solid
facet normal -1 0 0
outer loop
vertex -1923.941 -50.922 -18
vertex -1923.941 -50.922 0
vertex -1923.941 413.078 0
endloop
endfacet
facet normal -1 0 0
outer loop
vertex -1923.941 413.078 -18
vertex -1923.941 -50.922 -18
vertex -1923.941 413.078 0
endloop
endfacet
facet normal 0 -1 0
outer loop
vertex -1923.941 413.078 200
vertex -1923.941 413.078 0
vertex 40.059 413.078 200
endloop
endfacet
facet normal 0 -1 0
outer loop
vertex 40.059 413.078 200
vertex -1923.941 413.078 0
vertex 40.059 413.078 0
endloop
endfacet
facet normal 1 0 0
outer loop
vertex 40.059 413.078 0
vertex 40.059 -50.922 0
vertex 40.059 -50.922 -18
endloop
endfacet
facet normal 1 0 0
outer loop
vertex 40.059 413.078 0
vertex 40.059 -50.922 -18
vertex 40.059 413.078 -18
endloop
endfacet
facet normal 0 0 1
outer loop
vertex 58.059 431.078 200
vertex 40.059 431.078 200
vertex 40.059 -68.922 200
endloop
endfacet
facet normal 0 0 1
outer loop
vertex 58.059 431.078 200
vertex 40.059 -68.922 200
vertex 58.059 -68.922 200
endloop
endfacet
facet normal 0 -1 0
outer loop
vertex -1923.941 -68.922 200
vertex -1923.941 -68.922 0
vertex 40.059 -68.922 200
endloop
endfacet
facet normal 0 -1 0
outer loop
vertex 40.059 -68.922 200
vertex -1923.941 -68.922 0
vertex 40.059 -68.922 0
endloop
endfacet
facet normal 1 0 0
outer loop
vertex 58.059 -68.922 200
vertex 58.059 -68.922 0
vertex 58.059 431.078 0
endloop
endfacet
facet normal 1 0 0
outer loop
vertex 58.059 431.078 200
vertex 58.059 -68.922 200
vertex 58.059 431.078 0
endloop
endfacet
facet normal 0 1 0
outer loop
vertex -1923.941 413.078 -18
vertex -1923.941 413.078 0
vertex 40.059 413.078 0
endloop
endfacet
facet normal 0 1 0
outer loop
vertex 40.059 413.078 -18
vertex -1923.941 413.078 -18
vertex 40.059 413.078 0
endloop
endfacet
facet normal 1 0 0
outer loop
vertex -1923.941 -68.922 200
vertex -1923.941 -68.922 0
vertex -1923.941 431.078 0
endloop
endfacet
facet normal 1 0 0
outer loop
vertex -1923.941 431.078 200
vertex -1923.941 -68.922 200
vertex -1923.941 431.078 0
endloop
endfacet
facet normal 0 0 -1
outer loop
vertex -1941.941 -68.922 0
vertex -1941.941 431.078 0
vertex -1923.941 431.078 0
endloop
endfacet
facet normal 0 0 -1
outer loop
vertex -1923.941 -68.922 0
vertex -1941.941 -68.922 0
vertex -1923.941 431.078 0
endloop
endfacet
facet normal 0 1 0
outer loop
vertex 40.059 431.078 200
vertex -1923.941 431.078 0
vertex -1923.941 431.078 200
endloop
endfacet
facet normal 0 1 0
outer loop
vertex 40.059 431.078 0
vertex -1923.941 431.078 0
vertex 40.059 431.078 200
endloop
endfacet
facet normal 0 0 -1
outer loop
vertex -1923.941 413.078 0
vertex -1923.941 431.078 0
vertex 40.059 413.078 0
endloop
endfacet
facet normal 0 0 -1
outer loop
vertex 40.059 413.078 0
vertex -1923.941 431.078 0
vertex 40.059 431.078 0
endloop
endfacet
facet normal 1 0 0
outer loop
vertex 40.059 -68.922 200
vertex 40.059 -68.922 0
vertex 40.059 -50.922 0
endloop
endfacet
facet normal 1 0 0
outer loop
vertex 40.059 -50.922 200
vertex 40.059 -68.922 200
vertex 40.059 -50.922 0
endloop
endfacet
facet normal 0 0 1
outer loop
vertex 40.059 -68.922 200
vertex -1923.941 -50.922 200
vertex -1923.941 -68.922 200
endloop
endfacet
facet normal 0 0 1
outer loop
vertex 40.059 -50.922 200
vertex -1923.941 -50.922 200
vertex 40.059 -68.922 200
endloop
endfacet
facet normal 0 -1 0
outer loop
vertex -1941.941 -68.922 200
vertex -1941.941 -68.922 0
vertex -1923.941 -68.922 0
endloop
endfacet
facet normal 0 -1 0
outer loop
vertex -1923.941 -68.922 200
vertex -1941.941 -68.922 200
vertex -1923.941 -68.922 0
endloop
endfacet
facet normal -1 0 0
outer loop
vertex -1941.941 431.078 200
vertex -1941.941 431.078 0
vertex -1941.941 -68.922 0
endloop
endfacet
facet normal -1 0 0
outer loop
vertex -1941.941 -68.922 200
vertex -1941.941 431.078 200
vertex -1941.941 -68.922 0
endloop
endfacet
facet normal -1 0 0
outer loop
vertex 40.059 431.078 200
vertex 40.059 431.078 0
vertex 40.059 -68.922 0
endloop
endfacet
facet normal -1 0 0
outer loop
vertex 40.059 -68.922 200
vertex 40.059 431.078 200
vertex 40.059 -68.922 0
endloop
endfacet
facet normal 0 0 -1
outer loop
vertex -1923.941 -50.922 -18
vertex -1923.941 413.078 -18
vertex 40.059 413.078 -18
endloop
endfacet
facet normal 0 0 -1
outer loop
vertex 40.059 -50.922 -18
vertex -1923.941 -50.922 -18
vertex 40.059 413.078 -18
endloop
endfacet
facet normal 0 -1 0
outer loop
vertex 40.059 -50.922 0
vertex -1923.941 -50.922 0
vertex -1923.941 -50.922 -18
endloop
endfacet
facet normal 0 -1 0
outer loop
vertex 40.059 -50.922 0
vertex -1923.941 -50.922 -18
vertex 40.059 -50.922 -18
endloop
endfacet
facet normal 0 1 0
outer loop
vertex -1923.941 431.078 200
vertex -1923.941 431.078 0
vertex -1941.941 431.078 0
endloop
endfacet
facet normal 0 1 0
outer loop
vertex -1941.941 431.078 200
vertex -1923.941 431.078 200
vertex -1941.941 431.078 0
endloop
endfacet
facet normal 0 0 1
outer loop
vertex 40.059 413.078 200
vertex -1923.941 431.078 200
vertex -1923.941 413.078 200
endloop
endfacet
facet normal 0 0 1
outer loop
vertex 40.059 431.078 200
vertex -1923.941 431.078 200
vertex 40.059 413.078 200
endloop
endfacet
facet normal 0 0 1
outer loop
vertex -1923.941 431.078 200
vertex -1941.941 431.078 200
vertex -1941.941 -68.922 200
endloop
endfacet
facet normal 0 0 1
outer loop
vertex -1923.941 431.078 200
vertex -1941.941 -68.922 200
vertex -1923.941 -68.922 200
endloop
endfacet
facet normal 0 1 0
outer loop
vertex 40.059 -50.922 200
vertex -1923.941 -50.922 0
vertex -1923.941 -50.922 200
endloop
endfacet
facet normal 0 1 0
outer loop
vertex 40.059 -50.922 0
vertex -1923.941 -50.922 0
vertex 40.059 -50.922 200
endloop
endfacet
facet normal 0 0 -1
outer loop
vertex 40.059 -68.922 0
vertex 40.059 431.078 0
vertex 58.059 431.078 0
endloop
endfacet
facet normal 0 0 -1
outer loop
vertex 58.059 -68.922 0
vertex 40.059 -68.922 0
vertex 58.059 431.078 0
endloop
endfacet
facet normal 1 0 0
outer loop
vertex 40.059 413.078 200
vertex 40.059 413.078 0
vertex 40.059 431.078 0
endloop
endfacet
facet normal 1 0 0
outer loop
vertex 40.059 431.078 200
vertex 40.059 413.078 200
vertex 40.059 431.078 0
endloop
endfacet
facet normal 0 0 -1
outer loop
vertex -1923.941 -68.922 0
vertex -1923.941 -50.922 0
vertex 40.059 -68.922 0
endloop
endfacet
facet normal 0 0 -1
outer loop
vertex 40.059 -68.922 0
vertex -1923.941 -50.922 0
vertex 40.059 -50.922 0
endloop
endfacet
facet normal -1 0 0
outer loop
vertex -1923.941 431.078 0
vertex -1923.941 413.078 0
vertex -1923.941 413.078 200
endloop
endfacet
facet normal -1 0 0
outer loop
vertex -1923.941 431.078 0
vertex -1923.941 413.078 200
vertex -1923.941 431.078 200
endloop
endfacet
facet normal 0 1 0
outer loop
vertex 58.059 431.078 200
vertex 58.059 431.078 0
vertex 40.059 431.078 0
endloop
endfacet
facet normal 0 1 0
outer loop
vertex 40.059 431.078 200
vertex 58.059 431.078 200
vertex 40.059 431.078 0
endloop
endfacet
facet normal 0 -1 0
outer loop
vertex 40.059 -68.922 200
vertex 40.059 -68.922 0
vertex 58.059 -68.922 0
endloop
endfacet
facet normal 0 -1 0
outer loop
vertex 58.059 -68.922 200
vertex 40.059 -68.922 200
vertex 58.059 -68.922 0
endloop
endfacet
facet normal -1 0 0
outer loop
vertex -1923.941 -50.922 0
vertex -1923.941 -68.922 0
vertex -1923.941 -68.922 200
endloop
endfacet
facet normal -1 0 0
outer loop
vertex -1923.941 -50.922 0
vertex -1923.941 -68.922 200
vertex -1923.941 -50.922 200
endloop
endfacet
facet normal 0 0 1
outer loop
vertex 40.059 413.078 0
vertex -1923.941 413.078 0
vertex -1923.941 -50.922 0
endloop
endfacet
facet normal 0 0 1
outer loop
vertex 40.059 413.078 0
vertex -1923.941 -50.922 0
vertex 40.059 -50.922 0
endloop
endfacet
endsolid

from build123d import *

# Parameters (mm, degrees)
F1_DEPTH = 200
F0_W     = 1964
F0_H     = 18
F2_DEPTH = 200
F0_H_2   = 464
F3_DEPTH = 18


# Not quite as in the source:
# - the program builds the solid bodies; features that only make, move or delete a surface that nothing else refers to are left out


with BuildPart() as f1:
    # F0 (on Top) → F1 (new body)
    with BuildSketch(Plane.XY):
        Polygon((-1923.9414028525, 431.0778304935), (-1941.9414028525, 431.0778304935), (-1941.9414028525, -68.9221695065), (-1923.9414028525, -68.9221695065), (-1923.9414028525, -50.9221695065), (-1923.9414028525, 413.0778304935), align=None)
    extrude(amount=F1_DEPTH)


with BuildPart() as f1b:
    # F0 (on Top) → F1, piece 2 (new body)
    with BuildSketch(Plane.XY):
        Polygon((58.0585971475, 431.0778304935), (40.0585971475, 431.0778304935), (40.0585971475, 413.0778304935), (40.0585971475, -50.9221695065), (40.0585971475, -68.9221695065), (58.0585971475, -68.9221695065), align=None)
    extrude(amount=F1_DEPTH)


with BuildPart() as f2:
    # F0 (on Top) → F2 (new body)
    with BuildSketch(Plane.XY):
        with Locations((-941.9414028525, 422.0778304935)):
            Rectangle(F0_W, F0_H)
    extrude(amount=F2_DEPTH)


with BuildPart() as f2b:
    # F0 (on Top) → F2, piece 2 (new body)
    with BuildSketch(Plane.XY):
        with Locations((-941.9414028525, -59.9221695065)):
            Rectangle(F0_W, F0_H)
    extrude(amount=F2_DEPTH)


with BuildPart() as f3:
    # F0 (on Top) → F3 (new body)
    with BuildSketch(Plane.XY):
        with Locations((-941.9414028525, 181.0778304935)):
            Rectangle(F0_W, F0_H_2)
    extrude(amount=-F3_DEPTH)


solid = Compound([f1.part, f1b.part, f2.part, f2b.part, f3.part])
